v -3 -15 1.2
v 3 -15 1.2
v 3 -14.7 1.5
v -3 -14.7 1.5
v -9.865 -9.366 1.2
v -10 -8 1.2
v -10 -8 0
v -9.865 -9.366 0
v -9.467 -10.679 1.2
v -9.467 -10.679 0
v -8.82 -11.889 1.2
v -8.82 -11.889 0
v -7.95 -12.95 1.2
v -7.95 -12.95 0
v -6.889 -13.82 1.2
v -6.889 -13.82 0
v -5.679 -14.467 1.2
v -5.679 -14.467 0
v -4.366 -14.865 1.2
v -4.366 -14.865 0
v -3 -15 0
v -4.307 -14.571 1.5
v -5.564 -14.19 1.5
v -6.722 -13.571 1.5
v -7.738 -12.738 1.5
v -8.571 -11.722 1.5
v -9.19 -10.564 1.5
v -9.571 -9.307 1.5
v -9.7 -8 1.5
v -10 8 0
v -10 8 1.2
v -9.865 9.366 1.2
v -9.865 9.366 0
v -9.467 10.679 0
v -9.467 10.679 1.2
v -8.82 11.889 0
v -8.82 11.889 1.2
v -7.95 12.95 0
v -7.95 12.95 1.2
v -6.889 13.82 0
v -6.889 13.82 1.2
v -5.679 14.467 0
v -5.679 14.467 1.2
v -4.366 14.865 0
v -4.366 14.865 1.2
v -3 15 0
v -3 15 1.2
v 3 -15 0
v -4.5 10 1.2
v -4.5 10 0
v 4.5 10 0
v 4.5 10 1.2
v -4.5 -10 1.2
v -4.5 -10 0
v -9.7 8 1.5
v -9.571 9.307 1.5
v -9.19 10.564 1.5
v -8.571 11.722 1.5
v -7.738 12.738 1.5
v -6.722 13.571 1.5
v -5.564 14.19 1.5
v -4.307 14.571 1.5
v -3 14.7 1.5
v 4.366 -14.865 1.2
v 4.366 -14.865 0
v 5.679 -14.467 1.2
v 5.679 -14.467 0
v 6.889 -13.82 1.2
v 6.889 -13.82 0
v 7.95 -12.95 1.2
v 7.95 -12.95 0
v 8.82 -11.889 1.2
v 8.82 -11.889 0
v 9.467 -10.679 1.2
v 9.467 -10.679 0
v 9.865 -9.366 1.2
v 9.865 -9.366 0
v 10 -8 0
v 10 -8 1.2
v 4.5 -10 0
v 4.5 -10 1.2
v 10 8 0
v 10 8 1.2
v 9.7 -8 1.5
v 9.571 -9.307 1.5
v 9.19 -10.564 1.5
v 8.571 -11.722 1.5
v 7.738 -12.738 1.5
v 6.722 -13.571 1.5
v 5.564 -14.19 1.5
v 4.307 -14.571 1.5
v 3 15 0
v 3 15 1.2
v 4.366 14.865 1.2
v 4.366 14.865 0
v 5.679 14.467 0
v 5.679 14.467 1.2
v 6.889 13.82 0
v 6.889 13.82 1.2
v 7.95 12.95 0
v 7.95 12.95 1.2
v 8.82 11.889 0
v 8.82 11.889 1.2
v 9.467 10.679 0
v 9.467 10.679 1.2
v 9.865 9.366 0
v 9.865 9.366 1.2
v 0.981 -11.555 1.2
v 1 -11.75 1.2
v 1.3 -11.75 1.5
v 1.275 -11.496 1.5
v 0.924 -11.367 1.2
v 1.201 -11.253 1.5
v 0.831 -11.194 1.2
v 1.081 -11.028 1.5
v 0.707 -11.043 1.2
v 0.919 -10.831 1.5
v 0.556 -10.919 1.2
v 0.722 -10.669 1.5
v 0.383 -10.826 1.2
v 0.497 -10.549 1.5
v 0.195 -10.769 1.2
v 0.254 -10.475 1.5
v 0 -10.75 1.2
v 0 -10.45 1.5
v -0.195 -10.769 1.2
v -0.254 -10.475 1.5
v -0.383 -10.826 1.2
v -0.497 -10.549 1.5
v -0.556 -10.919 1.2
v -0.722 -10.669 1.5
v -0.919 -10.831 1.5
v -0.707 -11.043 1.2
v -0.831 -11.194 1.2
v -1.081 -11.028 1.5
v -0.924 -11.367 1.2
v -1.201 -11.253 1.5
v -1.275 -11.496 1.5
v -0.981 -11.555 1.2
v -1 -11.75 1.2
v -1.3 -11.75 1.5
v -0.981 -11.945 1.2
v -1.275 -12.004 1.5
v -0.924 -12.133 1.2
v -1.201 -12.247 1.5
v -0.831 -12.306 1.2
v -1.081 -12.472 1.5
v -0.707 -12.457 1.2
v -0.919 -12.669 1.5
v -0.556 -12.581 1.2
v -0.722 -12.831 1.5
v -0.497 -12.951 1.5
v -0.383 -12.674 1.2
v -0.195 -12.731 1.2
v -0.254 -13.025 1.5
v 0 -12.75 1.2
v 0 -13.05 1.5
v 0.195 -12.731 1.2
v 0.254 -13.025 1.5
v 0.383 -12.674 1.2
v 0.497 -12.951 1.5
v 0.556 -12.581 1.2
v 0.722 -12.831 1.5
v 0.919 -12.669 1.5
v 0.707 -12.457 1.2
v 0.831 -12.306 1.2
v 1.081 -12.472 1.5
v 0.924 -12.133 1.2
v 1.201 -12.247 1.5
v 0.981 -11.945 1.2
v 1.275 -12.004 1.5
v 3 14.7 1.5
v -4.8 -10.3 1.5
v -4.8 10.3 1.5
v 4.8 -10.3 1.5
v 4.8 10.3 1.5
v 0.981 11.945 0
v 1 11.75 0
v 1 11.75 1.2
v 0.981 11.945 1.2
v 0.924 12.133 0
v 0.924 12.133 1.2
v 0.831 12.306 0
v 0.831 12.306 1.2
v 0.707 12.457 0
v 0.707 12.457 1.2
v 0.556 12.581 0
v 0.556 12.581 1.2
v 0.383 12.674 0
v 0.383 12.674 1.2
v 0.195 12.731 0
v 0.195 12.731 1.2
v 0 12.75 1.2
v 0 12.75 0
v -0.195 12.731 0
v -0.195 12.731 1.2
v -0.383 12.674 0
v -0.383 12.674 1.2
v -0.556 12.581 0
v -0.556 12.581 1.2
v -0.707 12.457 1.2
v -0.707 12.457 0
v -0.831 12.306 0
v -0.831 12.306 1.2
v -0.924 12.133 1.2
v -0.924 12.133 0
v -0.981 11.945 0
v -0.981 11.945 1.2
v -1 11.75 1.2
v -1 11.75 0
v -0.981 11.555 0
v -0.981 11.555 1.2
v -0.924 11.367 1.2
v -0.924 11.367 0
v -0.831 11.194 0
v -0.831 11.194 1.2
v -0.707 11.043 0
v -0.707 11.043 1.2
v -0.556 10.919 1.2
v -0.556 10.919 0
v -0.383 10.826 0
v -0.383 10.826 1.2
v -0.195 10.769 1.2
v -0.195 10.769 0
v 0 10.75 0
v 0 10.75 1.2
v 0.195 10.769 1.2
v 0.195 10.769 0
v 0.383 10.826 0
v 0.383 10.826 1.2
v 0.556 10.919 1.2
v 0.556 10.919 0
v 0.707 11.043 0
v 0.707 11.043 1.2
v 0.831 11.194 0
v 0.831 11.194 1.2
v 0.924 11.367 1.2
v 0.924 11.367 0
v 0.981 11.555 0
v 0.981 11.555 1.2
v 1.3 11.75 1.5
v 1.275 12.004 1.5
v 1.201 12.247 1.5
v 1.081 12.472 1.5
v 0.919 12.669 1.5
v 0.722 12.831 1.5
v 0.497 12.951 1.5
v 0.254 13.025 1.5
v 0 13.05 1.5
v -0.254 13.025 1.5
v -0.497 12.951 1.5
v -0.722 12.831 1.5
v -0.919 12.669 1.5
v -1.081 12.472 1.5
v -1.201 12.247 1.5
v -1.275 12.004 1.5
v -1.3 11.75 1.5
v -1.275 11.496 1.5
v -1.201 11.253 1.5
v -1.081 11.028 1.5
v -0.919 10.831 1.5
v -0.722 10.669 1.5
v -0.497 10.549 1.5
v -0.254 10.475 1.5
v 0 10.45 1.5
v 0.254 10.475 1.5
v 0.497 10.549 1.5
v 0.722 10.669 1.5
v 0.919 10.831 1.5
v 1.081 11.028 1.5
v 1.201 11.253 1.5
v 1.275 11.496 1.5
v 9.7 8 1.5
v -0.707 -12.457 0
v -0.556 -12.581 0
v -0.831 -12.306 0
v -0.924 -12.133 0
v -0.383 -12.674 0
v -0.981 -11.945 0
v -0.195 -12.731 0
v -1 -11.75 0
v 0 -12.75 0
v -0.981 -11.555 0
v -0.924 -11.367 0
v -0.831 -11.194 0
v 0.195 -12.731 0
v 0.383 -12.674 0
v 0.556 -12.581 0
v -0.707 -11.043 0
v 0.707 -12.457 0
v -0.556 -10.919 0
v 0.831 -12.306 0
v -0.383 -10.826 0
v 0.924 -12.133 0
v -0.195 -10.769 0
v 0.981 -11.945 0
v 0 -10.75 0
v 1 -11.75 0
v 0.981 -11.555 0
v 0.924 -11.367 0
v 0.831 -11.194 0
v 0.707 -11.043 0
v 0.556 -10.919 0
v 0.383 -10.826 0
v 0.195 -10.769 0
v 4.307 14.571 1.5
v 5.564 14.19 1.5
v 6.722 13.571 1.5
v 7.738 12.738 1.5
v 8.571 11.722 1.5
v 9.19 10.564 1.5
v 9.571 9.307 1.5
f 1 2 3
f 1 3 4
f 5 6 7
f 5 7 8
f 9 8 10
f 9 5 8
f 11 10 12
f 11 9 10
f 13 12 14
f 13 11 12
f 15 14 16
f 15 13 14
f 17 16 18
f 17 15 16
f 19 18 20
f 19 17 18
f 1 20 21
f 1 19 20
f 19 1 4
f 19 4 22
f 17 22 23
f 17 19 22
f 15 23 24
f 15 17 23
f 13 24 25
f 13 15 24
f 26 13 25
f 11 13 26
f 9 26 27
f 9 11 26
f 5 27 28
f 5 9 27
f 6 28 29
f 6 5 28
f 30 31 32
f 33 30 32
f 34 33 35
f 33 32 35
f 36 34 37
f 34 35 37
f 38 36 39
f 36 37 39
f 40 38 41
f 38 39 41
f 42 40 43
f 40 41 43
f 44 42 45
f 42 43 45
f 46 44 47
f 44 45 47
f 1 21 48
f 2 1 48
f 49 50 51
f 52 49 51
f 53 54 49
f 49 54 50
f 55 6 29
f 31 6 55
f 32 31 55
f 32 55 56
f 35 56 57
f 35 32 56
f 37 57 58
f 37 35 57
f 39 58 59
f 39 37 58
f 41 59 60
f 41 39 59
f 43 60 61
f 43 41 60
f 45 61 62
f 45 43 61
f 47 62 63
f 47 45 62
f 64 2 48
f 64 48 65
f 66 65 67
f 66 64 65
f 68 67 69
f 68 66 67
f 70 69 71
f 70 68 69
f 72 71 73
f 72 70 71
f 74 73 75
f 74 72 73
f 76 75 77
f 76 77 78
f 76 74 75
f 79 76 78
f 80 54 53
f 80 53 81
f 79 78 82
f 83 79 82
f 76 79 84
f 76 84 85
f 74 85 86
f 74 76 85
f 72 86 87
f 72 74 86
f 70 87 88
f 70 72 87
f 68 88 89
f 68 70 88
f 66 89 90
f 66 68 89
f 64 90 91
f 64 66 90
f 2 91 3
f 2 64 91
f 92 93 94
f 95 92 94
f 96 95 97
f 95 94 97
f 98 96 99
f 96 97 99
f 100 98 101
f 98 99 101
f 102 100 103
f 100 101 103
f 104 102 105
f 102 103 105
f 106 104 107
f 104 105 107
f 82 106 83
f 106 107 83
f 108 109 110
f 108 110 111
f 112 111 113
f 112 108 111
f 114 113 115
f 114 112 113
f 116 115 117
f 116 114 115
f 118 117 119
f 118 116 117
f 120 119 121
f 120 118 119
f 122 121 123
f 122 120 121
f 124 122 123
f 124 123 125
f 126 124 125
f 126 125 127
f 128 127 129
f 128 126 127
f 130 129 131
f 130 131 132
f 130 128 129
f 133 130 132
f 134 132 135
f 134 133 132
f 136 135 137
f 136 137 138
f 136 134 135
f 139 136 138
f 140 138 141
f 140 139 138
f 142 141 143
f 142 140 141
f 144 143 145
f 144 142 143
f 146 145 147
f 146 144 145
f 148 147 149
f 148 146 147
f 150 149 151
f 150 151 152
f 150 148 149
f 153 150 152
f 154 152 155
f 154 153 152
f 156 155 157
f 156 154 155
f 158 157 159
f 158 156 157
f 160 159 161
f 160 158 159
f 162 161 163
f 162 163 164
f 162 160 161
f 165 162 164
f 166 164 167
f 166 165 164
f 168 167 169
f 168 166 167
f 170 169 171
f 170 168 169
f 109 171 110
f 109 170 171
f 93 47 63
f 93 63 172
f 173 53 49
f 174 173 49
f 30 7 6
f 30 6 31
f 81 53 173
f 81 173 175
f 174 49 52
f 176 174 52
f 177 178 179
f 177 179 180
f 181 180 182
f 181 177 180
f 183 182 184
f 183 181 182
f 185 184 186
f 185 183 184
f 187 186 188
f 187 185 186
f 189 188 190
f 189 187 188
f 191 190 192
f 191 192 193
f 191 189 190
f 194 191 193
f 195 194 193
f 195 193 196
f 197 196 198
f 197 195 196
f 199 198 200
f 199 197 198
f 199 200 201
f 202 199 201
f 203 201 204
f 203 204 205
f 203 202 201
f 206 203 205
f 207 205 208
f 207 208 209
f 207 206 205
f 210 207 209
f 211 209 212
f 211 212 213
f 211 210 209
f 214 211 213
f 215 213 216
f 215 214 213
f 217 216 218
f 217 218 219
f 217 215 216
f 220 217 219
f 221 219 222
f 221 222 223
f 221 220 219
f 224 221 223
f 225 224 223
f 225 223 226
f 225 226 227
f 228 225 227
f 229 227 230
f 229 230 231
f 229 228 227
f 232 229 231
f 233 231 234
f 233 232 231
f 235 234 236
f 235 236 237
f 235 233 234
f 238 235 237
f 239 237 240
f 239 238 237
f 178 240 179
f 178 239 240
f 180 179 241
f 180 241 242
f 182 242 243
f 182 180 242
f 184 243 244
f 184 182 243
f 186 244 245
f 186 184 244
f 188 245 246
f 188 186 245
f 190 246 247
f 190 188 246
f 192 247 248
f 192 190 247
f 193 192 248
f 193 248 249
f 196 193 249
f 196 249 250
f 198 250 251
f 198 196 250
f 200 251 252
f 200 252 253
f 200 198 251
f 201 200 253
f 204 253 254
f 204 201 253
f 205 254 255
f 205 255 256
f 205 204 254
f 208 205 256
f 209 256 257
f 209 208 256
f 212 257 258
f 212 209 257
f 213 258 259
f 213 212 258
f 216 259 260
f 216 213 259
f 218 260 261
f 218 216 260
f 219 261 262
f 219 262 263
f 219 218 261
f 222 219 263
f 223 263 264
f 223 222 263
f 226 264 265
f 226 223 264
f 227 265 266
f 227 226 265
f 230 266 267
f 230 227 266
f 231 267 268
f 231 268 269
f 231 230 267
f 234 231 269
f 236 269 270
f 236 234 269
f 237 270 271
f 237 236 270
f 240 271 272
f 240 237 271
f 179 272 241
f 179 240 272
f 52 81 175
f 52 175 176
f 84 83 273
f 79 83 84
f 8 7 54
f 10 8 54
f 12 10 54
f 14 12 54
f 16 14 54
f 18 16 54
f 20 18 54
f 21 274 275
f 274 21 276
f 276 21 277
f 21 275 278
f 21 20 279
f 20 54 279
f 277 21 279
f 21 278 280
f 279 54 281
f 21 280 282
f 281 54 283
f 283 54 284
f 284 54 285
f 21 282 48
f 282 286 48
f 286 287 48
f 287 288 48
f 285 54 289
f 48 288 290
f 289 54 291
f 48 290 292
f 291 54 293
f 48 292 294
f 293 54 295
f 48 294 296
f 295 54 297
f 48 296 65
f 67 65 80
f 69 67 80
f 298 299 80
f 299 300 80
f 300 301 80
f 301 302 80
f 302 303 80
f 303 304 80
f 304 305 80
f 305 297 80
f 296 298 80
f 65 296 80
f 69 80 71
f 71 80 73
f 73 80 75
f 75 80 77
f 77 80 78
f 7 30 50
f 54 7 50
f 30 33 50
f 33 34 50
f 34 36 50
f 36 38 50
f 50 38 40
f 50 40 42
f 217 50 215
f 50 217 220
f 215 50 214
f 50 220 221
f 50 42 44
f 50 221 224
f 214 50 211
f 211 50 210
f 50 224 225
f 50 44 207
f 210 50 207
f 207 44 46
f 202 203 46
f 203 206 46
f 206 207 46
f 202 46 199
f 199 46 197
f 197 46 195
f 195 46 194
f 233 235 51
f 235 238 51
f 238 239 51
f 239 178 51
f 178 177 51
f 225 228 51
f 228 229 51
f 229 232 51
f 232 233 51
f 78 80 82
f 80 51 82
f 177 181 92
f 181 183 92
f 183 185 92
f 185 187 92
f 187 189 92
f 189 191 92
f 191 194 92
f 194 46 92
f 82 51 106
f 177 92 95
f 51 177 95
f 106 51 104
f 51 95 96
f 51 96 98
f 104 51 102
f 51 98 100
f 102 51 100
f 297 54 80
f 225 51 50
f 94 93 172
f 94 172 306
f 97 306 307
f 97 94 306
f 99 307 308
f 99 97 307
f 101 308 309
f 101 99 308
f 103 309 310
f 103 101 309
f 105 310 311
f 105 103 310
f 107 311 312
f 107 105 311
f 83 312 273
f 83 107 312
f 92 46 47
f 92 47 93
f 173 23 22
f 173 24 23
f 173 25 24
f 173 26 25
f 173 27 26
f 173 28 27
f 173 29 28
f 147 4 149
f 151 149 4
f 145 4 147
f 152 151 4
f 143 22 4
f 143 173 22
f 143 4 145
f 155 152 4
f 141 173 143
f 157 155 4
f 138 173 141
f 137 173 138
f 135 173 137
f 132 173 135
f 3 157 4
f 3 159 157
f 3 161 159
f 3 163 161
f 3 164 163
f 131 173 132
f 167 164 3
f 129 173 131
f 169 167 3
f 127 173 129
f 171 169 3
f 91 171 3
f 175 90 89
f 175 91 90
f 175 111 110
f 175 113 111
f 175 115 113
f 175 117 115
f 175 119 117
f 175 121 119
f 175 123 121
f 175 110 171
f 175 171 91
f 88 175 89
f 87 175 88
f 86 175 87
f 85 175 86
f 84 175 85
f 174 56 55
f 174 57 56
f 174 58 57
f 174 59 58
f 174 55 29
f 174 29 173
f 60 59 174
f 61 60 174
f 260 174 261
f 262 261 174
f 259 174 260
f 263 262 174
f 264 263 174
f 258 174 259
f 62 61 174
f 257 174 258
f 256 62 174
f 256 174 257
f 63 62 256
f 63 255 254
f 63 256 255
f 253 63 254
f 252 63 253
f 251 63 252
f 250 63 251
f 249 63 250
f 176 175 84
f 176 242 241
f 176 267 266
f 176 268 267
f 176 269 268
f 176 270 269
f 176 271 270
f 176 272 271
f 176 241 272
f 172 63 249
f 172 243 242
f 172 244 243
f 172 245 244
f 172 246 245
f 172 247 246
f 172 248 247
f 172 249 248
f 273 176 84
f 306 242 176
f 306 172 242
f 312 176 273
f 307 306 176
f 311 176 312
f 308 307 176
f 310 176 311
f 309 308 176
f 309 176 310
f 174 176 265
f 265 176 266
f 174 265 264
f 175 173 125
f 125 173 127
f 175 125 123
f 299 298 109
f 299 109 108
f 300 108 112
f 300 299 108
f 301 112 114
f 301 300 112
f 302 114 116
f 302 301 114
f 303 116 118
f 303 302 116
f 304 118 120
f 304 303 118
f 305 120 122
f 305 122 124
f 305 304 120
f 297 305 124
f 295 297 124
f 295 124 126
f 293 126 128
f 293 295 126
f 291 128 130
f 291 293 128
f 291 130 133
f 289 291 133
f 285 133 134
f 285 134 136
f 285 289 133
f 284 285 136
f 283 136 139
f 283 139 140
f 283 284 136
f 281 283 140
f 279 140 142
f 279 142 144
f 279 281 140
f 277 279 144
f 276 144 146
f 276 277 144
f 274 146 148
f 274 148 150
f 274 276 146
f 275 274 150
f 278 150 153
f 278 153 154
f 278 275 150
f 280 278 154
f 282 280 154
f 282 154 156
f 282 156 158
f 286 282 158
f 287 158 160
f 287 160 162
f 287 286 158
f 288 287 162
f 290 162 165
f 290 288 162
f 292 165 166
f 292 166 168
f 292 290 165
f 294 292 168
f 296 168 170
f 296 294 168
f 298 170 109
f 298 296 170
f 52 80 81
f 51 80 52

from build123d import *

# Parameters (mm, degrees)
F0_W     = 20
F0_H     = 30
F0_R     = 1
F0_W_2   = 9
F0_H_2   = 20
F1_DEPTH = 1.5
F2_R     = 7
F3_SIZE  = 0.3


with BuildPart() as f1:
    # F0 (on Top) → F1 (new body)
    with BuildSketch(Plane.XY):
        Rectangle(F0_W, F0_H)
        with Locations((0, -11.75)):
            Circle(F0_R, mode=Mode.SUBTRACT)
        Rectangle(F0_W_2, F0_H_2, mode=Mode.SUBTRACT)
        with Locations((0, 11.75)):
            Circle(F0_R, mode=Mode.SUBTRACT)
    extrude(amount=F1_DEPTH)

    # F2
    f2_edges = [f1.edges().sort_by_distance(p)[0] for p in [
        (-10, -15, 0.75),
        (10, -15, 0.75),
        (10, 15, 0.75),
        (-10, 15, 0.75),
    ]]
    fillet(f2_edges, radius=F2_R)

    # F3
    f3_edges = [f1.edges().sort_by_distance(p)[0] for p in [
        (-1, -11.75, 1.5),
        (-1, 11.75, 1.5),
        (0, 10, 1.5),
        (-4.5, 0, 1.5),
        (0, -10, 1.5),
        (4.5, 0, 1.5),
        (0, 15, 1.5),
        (-7.949747, 12.949747, 1.5),
        (-10, 0, 1.5),
        (7.949747, 12.949747, 1.5),
        (10, 0, 1.5),
        (7.949747, -12.949747, 1.5),
        (0, -15, 1.5),
        (-7.949747, -12.949747, 1.5),
    ]]
    chamfer(f3_edges, length=F3_SIZE)


solid = f1.part
